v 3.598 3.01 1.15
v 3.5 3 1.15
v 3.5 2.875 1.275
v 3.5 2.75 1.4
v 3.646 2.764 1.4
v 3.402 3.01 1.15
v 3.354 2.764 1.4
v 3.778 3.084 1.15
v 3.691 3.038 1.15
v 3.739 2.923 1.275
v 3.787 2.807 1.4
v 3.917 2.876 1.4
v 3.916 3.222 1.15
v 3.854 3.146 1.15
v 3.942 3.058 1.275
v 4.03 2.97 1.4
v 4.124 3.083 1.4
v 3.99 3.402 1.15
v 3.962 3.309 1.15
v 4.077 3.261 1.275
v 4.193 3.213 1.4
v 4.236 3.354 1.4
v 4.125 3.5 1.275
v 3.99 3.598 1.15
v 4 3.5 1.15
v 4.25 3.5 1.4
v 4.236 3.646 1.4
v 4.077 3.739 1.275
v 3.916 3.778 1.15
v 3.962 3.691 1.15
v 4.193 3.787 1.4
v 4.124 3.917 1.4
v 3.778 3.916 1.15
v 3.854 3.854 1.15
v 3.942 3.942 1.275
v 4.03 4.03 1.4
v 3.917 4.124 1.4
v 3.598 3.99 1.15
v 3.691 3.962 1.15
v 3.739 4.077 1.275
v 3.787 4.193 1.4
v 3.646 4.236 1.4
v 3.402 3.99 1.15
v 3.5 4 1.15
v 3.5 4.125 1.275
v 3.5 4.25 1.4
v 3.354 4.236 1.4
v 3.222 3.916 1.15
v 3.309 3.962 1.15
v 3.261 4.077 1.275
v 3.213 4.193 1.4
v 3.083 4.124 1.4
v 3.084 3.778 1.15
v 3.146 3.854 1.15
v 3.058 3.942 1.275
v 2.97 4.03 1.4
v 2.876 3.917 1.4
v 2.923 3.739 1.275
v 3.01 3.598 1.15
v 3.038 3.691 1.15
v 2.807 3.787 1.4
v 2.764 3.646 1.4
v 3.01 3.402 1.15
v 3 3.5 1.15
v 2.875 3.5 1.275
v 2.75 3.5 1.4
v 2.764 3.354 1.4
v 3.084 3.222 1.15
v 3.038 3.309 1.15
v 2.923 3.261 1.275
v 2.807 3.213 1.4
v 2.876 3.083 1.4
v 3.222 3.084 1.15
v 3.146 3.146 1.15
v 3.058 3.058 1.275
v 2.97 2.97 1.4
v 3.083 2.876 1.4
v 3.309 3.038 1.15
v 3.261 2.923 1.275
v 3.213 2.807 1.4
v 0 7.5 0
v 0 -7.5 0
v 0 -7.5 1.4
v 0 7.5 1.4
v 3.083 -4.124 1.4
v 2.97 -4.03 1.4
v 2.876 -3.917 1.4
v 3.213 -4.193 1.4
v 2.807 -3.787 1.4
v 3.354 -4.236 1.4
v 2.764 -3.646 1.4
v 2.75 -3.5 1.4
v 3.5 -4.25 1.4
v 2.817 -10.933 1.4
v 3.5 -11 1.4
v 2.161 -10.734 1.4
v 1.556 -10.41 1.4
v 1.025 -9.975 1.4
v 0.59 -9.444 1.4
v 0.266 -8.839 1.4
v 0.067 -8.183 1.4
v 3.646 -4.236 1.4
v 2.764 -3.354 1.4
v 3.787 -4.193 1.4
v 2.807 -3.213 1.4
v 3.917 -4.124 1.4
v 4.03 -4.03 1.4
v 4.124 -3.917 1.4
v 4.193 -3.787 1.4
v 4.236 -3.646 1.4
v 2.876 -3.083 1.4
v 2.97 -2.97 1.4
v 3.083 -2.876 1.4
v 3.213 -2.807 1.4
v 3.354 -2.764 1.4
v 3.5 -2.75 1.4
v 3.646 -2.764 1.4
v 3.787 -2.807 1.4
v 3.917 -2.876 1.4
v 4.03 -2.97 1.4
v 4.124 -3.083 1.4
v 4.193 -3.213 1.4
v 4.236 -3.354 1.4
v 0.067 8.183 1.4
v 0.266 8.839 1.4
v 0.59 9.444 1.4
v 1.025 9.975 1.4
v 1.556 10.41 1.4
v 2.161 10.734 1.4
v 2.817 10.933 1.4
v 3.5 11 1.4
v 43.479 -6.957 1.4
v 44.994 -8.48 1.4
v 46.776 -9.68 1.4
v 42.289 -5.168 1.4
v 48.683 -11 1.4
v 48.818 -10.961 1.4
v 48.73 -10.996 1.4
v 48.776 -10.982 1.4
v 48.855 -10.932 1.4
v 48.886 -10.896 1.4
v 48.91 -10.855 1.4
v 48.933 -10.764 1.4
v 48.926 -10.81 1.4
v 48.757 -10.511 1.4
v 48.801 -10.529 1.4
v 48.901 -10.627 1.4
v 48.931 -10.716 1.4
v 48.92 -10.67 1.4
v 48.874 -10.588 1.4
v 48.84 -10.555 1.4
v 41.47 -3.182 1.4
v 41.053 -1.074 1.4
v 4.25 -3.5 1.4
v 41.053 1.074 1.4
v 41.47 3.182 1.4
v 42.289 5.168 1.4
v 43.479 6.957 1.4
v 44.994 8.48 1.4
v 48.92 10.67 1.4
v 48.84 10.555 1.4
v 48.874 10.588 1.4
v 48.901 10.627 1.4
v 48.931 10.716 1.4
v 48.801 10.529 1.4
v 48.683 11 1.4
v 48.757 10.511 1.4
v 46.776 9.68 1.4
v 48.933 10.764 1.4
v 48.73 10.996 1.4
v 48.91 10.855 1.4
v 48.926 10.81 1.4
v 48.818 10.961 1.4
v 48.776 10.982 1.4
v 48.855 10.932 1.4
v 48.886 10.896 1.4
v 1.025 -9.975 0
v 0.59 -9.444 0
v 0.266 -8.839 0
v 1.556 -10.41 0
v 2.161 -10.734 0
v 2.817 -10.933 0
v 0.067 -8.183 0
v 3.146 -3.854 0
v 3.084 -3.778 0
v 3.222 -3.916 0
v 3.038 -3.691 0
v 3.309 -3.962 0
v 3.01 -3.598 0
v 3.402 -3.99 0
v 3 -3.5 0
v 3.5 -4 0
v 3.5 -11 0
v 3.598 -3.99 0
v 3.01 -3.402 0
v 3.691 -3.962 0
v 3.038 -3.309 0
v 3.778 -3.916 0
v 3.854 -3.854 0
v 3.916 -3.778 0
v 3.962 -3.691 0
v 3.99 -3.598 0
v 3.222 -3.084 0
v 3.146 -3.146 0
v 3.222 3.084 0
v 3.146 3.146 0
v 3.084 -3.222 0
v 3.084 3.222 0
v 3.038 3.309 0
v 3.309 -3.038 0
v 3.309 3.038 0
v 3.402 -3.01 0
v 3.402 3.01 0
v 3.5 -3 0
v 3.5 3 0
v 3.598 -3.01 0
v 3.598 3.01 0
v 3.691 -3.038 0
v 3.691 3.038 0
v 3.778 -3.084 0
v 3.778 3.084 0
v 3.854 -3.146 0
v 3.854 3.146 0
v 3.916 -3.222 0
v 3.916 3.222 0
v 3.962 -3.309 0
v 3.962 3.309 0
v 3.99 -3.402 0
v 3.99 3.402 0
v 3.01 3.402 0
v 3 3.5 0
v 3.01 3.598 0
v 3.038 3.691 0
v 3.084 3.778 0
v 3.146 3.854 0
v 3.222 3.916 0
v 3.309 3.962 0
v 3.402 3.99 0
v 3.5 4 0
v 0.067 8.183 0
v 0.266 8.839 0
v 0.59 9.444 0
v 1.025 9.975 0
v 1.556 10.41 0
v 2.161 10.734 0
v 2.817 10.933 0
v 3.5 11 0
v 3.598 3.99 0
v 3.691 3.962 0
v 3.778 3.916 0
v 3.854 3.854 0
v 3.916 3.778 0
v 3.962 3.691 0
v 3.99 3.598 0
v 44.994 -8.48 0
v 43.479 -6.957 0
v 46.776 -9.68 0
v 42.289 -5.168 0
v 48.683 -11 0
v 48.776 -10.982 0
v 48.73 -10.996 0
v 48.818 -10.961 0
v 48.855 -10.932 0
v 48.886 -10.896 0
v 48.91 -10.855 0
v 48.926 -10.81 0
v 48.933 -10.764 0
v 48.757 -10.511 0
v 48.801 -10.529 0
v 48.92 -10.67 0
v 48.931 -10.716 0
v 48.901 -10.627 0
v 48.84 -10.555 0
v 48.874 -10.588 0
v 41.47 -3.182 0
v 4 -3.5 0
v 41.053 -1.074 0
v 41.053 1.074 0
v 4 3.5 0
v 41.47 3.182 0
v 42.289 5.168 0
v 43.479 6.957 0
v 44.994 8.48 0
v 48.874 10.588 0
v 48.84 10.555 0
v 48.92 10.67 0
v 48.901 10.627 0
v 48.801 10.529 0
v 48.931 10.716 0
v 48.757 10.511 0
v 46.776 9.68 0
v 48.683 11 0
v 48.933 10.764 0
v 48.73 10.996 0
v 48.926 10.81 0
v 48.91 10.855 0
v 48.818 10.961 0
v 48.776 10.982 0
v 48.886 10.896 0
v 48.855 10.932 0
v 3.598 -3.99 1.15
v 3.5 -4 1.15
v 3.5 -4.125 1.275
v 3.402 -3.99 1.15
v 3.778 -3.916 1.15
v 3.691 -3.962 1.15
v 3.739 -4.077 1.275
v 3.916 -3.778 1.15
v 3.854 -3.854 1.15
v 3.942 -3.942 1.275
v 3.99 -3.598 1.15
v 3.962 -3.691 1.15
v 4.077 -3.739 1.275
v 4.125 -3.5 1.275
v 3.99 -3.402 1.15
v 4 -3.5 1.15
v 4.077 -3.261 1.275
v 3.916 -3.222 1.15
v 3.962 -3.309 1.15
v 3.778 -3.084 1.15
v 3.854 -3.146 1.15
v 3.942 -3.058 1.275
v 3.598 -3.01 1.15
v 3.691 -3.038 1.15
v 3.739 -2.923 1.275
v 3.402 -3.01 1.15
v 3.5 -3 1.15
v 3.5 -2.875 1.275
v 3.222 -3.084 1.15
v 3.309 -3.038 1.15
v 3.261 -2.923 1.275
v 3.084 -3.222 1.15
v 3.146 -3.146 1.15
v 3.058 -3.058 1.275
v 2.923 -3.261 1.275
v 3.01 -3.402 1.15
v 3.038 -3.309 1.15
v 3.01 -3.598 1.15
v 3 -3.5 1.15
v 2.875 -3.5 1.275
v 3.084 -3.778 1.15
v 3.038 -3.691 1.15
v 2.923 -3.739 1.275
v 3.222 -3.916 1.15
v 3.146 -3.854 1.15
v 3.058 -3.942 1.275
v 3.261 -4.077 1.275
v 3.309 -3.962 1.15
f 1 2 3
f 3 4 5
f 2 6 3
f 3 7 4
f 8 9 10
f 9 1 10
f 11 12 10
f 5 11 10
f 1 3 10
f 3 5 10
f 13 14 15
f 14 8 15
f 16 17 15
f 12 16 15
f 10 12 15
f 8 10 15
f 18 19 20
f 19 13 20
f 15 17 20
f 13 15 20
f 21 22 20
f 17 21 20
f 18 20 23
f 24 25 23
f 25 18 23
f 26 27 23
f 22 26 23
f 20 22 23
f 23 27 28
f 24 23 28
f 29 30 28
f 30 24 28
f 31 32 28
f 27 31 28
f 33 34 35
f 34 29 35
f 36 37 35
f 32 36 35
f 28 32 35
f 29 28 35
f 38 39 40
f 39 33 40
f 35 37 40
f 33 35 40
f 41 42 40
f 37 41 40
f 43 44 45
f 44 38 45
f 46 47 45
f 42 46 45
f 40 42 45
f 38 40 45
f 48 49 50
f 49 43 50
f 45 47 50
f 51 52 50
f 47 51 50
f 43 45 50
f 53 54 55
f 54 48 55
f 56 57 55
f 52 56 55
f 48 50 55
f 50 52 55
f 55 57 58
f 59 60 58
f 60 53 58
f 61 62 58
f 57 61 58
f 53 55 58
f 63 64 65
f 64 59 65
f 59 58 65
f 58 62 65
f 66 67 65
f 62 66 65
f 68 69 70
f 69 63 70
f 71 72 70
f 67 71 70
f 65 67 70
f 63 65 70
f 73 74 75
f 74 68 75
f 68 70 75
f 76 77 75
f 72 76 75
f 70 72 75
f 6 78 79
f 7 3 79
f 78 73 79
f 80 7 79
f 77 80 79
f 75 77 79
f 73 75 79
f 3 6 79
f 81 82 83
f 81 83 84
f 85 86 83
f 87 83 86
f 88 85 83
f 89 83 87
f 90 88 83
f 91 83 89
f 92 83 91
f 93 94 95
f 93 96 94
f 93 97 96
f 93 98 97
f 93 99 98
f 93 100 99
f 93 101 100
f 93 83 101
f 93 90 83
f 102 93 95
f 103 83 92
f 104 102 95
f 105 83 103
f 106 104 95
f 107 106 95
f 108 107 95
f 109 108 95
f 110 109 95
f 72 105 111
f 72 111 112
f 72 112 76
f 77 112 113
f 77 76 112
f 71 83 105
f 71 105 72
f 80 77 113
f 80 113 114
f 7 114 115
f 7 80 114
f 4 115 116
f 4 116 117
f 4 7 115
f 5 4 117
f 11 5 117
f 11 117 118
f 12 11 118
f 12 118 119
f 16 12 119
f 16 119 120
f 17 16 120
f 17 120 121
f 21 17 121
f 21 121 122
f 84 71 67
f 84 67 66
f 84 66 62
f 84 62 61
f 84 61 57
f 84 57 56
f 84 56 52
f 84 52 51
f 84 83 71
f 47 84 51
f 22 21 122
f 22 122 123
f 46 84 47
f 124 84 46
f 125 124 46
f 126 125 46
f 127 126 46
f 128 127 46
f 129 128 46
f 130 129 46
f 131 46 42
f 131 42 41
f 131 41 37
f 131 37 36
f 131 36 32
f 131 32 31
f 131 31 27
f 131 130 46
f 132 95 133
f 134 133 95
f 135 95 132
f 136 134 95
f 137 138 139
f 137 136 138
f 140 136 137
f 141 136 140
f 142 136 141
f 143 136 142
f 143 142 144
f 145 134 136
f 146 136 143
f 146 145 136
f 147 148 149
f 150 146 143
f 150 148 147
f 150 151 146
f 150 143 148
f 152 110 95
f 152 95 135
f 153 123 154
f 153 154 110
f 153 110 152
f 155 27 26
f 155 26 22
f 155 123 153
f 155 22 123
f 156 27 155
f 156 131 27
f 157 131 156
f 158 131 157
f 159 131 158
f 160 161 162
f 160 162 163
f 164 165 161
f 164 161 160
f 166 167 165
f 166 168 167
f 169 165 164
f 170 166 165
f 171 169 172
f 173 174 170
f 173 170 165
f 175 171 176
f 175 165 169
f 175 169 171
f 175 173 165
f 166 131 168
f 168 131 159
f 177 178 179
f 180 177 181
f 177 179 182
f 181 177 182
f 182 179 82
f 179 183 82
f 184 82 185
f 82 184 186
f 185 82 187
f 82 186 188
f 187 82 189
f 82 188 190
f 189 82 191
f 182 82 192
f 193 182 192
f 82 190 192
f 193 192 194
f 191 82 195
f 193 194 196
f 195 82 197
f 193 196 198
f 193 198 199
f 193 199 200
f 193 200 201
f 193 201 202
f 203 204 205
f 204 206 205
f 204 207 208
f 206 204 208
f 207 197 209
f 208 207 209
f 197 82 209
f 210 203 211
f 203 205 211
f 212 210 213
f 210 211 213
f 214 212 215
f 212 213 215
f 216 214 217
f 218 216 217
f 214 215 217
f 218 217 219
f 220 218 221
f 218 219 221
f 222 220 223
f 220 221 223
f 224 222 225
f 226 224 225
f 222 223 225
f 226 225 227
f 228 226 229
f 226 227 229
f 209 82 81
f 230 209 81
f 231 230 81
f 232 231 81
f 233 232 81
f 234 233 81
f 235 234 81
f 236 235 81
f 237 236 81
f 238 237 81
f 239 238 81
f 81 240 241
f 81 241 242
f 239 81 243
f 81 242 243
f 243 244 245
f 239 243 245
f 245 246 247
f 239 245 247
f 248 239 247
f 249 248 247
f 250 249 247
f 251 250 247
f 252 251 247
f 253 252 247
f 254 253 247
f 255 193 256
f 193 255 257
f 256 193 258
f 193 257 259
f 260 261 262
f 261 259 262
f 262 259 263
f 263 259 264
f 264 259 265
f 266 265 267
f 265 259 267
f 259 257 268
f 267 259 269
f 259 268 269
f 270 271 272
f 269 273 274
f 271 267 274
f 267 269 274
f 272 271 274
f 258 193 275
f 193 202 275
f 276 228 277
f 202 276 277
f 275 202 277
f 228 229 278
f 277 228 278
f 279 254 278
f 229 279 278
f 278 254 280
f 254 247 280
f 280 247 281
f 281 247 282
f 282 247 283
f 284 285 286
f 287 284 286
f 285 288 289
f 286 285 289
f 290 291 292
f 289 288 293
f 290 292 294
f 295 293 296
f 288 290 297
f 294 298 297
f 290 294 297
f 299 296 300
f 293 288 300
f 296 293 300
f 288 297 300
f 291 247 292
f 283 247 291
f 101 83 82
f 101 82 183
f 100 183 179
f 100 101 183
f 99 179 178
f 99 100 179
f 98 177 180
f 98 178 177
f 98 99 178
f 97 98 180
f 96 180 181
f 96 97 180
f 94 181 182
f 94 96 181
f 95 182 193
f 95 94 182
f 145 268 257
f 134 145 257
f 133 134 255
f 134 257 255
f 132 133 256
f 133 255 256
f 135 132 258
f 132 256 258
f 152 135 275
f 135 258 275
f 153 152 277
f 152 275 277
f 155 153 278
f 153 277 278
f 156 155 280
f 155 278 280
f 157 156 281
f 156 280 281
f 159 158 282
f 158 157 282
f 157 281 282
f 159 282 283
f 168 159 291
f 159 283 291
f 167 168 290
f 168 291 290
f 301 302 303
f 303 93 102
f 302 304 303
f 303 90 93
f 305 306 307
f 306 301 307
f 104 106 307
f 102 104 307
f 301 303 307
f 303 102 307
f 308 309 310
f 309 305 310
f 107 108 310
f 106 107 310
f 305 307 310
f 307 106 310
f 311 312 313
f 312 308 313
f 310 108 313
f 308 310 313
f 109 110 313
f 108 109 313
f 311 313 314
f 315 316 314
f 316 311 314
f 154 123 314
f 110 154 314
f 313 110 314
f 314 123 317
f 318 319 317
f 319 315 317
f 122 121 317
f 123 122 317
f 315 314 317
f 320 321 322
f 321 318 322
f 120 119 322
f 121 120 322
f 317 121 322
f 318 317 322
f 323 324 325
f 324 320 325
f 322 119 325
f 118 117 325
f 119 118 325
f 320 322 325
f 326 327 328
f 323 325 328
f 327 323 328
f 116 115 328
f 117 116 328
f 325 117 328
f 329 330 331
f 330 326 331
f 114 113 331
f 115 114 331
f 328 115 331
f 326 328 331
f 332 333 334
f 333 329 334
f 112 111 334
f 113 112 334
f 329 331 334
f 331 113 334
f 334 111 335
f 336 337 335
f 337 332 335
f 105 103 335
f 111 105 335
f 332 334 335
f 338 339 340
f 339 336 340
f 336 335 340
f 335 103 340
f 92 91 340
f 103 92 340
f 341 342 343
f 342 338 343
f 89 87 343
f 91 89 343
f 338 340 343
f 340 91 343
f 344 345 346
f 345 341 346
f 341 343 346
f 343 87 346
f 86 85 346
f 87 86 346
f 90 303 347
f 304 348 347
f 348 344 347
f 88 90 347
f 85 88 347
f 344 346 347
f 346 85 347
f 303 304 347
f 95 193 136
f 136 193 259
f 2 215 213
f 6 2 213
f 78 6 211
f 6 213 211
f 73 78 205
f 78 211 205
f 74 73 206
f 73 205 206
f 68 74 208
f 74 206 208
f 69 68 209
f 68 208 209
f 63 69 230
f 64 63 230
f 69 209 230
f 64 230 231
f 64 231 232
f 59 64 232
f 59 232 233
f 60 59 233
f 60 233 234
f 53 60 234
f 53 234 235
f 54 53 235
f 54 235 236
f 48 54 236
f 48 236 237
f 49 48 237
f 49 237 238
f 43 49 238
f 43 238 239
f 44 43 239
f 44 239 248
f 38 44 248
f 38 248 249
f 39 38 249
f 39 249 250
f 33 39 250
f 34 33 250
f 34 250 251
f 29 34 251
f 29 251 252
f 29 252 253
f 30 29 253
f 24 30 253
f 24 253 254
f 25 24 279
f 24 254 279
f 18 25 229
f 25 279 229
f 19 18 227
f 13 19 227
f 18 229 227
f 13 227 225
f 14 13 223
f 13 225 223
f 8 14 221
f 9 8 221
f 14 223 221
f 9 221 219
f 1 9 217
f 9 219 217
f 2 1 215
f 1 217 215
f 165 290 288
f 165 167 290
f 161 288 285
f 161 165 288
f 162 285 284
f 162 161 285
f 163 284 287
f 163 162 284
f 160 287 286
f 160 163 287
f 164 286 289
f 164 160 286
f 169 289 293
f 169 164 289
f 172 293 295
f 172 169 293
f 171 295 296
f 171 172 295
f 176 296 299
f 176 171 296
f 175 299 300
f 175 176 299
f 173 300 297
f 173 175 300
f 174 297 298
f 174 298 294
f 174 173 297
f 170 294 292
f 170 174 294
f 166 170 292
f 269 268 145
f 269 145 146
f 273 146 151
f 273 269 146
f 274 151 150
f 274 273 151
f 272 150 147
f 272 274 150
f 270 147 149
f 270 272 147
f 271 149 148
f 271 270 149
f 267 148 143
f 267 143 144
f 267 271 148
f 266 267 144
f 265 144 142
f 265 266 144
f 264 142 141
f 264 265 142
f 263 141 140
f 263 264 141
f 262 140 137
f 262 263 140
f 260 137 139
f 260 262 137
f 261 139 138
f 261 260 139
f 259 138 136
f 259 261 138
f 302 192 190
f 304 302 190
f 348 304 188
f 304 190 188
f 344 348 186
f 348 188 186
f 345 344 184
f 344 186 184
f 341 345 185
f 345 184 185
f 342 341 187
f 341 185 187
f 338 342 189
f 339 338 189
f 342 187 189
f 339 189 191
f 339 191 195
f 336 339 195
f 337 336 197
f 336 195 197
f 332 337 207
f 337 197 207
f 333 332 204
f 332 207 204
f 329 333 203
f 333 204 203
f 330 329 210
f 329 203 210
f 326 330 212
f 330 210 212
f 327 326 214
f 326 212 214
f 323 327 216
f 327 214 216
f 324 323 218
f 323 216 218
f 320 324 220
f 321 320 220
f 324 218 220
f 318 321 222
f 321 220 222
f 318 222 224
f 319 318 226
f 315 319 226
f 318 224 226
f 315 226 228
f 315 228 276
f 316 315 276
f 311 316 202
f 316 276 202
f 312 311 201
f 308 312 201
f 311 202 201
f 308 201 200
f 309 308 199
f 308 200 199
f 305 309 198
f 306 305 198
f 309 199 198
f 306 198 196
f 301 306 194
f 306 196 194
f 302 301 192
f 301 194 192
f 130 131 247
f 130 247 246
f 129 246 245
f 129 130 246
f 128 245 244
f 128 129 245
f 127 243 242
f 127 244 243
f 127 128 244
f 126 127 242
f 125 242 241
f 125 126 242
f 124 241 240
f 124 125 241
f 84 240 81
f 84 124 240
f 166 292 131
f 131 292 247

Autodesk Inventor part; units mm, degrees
ref_plane "YZ Plane" through (0, 0, 0) normal (1, 0, 0) x (0, 1, 0)
ref_plane "XZ Plane" through (0, 0, 0) normal (0, 1, 0) x (-1, 0, 0)
ref_plane "XY Plane" through (0, 0, 0) normal (0, 0, 1) x (1, 0, 0)
sketch "Эскиз1" plane through (0, 0, 0) normal (0, 0, 1) x (1, 0, 0)
  line L0 (52, 11) -> (0, 11)
  line L1 (0, -11) -> (52, -11)
  arc A0 (52, 11) -> (52, -11) centre (52, 0) ccw
  line L2 (0, -11) -> (0, 11)
  line L3 (0, 0) -> (41, 0) construction
  line L4 (0, 0) -> (0, 11) construction
  line L5 (0, 11) -> (0, 11.25)
  point P0 (20.5, 0)
  dimension "d0" = 11
  dimension "d47" = 41
extrude "Выдавливание3" add sketch "Эскиз1" along normal blind 1.4
fillet "Сопряжение3" radius 0.25 2 edges at (52, 11, 0.7) (52, -11, 0.7)
fillet "Сопряжение4" radius 3.5 2 edges at (0, -11, 0.7) (0, 11, 0.7)
sketch "Эскиз6" plane through (0, 0, 1.4) normal (0, 0, 1) x (1, 0, 0)
  arc A0 (48.7571, 10.5111) -> (48.7571, -10.5111) centre (52, 0) ccw construction
  line L0 (41, 0) -> (0, 0) construction
  line L1 (0, -11) -> (0, 11) construction
  circle A1 centre (3.5, 3.5) radius 0.5
  line L2 (3.5, 3.5) -> (0, 3.5) construction
  line L3 (3.5, 3.5) -> (3.5, 0) construction
  circle A2 centre (3.5, -3.5) radius 0.5
  point P0 (48.6834, -11)
  dimension "d58" = 1
  dimension "d59" = 3.5
hole "Отверстие1" at (3.5, -3.5, 1.4) at (3.5, 3.5, 1.4) direction (0, 0, -1) diameter 1 end through all countersink diameter 1.5 countersink angle 90
properties part number "Поршень"
